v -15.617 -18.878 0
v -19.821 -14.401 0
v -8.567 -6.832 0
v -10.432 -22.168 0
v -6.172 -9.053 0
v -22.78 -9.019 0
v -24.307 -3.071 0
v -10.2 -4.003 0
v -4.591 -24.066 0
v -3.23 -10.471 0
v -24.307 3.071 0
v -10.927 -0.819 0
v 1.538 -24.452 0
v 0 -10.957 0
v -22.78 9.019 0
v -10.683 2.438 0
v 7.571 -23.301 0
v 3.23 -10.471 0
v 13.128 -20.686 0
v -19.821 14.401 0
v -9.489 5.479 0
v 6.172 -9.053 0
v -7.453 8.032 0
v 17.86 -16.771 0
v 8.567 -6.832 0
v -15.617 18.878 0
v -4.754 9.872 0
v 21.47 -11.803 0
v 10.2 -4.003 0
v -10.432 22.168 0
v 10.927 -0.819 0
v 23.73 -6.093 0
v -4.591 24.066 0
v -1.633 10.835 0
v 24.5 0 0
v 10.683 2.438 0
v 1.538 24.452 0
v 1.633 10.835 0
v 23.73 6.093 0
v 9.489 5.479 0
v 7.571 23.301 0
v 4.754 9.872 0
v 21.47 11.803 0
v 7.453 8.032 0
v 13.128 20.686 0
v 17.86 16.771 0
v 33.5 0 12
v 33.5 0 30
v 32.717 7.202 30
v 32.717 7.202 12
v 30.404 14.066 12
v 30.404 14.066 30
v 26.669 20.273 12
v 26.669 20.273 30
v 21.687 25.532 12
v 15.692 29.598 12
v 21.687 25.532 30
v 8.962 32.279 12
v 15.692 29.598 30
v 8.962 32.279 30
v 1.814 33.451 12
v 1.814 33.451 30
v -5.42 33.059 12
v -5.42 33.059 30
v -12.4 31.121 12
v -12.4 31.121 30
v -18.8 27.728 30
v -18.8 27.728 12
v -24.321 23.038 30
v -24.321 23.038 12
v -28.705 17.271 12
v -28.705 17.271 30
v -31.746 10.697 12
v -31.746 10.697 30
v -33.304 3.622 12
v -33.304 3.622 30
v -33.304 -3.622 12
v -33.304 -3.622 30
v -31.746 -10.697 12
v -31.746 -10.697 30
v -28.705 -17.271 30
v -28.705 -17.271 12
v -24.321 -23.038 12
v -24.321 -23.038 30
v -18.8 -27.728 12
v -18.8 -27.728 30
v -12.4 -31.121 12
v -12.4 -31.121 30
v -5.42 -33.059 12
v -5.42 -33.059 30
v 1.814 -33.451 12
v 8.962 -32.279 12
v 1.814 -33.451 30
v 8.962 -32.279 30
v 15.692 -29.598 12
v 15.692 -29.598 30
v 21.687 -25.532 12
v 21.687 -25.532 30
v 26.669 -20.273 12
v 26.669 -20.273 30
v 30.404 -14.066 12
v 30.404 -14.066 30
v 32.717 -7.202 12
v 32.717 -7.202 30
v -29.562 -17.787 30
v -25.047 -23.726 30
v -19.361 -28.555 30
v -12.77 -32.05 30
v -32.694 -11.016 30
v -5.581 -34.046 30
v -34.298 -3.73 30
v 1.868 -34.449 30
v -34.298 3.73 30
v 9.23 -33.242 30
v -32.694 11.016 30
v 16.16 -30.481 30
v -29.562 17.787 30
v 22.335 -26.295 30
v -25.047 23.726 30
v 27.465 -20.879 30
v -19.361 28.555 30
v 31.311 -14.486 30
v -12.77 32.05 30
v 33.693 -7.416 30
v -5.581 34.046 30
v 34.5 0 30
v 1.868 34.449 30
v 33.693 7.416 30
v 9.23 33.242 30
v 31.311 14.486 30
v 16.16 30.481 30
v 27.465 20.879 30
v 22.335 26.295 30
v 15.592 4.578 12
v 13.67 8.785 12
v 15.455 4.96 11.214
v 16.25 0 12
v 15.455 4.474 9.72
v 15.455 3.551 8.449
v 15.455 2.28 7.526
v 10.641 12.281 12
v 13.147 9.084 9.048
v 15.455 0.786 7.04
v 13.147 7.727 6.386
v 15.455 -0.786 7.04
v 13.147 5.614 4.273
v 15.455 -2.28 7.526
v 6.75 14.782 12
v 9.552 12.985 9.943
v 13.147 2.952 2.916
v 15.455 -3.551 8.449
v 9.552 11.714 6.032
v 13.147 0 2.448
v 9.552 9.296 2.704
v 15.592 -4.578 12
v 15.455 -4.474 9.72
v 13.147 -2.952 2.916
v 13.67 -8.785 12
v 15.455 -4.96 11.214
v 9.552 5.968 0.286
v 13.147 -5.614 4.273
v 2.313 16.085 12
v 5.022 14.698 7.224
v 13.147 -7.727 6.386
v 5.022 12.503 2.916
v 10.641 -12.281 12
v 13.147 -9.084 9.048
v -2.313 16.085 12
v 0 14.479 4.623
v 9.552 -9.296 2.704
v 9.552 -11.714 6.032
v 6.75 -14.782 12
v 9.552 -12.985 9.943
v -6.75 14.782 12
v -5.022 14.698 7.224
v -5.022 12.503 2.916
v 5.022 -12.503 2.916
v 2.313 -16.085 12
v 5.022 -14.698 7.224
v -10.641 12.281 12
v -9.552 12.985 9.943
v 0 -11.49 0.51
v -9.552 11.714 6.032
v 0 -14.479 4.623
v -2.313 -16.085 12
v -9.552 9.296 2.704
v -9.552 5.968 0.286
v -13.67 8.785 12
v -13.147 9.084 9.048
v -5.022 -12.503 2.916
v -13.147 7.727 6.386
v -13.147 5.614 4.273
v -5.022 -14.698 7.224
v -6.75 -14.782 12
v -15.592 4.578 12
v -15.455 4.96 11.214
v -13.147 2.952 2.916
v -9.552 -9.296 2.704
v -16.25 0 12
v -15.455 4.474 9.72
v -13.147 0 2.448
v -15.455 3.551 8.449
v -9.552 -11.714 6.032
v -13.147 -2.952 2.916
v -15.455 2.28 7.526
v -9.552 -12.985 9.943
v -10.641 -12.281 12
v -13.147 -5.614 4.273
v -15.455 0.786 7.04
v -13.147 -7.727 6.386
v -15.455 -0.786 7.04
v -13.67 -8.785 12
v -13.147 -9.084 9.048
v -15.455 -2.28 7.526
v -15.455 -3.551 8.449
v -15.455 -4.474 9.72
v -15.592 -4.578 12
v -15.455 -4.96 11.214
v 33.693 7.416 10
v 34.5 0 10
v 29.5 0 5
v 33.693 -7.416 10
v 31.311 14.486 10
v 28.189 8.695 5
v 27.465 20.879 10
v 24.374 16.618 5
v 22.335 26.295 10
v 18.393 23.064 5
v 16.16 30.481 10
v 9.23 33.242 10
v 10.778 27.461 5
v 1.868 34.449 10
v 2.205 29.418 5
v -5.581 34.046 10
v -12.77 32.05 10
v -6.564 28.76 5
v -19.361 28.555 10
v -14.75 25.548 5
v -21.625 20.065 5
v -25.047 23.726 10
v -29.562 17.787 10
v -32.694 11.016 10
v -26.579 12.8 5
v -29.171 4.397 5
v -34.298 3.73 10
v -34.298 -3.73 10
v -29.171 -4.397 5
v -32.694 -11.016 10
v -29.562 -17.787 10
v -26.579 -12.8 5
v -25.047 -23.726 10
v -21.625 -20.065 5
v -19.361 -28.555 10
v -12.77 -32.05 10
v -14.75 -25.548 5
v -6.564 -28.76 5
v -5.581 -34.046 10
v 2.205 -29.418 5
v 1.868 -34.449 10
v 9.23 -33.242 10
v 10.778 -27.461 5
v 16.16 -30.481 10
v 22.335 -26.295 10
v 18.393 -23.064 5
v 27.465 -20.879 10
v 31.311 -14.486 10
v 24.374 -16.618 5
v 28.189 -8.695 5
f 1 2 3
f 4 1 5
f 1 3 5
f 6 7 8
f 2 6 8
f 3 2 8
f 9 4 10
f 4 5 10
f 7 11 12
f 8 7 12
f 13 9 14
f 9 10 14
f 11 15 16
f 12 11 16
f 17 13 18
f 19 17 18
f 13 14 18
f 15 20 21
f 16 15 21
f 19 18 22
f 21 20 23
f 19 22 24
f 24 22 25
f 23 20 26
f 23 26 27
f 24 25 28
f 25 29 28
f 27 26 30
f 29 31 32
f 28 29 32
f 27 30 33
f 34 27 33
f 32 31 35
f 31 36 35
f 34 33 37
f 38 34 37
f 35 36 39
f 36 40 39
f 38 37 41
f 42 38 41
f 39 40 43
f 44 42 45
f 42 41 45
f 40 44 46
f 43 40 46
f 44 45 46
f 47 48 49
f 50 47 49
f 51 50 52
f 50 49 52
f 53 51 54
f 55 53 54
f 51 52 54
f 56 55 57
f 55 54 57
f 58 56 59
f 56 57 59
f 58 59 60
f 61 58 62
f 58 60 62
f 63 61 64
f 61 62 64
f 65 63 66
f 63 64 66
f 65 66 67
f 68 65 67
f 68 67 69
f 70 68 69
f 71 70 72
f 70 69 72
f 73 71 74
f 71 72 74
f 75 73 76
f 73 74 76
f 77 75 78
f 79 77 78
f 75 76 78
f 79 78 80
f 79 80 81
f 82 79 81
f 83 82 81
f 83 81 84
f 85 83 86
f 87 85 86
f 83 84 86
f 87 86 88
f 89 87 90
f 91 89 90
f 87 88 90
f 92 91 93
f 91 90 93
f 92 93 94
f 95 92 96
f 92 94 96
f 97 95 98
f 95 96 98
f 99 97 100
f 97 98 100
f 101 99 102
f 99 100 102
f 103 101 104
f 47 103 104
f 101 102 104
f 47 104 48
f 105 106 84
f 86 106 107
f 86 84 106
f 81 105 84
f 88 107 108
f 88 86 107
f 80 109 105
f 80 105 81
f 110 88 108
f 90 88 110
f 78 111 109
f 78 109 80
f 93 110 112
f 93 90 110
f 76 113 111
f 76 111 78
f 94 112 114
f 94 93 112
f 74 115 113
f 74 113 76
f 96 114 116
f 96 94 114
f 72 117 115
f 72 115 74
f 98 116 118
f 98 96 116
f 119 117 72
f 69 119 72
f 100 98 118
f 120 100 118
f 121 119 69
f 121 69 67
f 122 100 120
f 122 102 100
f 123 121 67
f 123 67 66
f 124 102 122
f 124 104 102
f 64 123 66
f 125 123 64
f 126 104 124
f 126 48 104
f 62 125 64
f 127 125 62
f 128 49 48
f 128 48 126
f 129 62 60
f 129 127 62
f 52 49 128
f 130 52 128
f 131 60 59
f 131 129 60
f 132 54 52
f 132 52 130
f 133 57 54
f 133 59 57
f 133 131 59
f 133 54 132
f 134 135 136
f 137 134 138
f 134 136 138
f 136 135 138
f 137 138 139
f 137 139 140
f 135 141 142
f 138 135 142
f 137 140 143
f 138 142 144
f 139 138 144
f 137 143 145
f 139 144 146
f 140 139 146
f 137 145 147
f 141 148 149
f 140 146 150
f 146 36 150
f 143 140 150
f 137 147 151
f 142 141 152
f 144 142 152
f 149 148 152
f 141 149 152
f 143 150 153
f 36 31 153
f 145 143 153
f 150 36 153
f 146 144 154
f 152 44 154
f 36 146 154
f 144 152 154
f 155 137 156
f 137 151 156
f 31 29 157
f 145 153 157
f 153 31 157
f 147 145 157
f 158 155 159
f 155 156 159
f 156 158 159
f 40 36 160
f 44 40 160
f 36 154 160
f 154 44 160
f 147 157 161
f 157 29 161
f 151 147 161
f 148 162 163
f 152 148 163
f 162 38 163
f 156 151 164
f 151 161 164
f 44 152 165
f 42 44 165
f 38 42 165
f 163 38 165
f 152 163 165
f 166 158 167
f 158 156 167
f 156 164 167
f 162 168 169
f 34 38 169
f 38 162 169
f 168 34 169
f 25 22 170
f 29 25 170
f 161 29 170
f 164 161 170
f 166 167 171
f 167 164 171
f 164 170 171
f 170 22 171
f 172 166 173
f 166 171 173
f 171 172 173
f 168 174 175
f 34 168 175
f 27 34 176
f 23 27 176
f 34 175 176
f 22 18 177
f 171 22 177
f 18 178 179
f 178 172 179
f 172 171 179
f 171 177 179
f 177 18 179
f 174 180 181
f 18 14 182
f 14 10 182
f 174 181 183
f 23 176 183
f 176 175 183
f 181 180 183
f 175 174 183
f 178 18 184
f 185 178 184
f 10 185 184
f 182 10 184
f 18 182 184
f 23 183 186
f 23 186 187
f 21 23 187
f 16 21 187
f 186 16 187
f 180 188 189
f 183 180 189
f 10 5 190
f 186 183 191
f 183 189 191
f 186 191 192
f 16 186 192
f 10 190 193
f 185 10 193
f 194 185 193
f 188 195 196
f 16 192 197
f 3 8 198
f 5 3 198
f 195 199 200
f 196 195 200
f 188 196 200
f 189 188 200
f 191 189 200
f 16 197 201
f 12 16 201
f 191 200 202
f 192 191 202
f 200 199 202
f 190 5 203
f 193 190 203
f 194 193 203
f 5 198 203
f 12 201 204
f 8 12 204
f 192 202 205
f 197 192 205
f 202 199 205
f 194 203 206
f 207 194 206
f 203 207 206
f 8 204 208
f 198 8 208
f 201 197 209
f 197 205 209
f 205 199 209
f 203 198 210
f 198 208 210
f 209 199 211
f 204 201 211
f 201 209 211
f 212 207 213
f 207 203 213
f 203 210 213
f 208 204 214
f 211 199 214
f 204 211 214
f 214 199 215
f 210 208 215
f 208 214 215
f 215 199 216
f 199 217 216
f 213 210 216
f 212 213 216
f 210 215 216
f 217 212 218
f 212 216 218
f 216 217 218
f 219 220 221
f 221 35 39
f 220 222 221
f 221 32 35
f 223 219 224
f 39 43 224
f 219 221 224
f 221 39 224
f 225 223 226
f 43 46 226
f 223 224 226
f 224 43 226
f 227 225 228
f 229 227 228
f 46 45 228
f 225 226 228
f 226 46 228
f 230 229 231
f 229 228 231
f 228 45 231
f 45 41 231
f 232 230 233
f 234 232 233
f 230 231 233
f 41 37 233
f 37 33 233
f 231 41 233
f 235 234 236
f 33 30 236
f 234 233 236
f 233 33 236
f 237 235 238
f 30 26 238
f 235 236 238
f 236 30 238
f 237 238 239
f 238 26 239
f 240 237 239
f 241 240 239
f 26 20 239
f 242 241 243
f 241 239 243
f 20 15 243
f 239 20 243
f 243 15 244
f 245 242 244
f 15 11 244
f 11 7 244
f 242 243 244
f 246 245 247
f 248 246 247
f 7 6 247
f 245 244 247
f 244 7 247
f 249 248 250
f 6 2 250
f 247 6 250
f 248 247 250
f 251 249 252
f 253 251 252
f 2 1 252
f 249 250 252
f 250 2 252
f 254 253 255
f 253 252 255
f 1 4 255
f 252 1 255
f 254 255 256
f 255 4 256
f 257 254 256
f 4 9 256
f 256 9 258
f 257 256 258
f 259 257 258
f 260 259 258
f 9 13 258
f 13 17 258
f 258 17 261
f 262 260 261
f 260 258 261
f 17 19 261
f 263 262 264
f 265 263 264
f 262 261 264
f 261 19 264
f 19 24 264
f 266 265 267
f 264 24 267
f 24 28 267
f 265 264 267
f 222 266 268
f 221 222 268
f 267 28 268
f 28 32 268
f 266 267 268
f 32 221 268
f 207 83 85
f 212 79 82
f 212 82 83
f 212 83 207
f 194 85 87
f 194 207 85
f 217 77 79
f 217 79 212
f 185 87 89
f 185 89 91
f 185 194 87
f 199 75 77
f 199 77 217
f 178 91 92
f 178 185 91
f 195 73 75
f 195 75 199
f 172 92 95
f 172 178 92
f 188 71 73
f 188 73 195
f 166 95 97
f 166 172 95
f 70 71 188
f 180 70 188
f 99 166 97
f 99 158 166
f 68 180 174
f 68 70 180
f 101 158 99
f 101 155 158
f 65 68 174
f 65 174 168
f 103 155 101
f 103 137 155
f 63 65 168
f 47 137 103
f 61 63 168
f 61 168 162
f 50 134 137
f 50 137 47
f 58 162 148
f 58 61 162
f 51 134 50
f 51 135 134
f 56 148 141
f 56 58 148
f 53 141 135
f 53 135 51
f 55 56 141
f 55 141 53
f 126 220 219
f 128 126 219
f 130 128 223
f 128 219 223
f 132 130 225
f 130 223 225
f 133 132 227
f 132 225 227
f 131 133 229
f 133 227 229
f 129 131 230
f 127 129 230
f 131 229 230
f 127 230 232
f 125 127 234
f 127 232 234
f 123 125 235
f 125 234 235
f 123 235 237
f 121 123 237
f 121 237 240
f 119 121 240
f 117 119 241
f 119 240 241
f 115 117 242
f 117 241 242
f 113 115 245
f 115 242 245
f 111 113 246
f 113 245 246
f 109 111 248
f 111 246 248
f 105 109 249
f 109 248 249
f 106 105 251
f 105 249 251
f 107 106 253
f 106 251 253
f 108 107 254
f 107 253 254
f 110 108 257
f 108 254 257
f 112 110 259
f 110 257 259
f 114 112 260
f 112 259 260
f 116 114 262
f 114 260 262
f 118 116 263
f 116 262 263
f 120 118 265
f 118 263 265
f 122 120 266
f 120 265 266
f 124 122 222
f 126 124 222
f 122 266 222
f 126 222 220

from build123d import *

# Parameters (mm, degrees)
SKETCH1_R           = 34.5
BOSS_EXTRUDE1_DEPTH = 30
SKETCH5_R           = 33.5
CUT_EXTRUDE2_DEPTH  = 18
CUT_REVOLVE3_ANGLE  = 180
CHAMFER1_SIZE       = 10


with BuildPart() as part:
    # Sketch1 → Boss-Extrude1 (new body)
    with BuildSketch(Plane.XY):
        Circle(SKETCH1_R)
    extrude(amount=BOSS_EXTRUDE1_DEPTH)

    # Sketch5 → Cut-Extrude2 (cut)
    with BuildSketch(Plane.XY.offset(30)):
        Circle(SKETCH5_R)
    extrude(amount=-CUT_EXTRUDE2_DEPTH, mode=Mode.SUBTRACT)

    # Sketch7 → Cut-Revolve3 (revolve, cut)
    with BuildSketch(Plane.XY.offset(12)):
        with BuildLine():
            Line((-16.25, 0), (16.25, 0))
            ThreePointArc((16.25, 0), (0, 16.25), (-16.25, 0))
        make_face()
    revolve(axis=Axis((-16.25, 0, 12), (-1, 0, 0)), revolution_arc=CUT_REVOLVE3_ANGLE, mode=Mode.SUBTRACT)

    # Chamfer1
    chamfer1_edges = [part.edges().sort_by_distance(p)[0] for p in [
        (-34.5, 0, 0),
    ]]
    chamfer(chamfer1_edges, length=CHAMFER1_SIZE)


solid = part.part
